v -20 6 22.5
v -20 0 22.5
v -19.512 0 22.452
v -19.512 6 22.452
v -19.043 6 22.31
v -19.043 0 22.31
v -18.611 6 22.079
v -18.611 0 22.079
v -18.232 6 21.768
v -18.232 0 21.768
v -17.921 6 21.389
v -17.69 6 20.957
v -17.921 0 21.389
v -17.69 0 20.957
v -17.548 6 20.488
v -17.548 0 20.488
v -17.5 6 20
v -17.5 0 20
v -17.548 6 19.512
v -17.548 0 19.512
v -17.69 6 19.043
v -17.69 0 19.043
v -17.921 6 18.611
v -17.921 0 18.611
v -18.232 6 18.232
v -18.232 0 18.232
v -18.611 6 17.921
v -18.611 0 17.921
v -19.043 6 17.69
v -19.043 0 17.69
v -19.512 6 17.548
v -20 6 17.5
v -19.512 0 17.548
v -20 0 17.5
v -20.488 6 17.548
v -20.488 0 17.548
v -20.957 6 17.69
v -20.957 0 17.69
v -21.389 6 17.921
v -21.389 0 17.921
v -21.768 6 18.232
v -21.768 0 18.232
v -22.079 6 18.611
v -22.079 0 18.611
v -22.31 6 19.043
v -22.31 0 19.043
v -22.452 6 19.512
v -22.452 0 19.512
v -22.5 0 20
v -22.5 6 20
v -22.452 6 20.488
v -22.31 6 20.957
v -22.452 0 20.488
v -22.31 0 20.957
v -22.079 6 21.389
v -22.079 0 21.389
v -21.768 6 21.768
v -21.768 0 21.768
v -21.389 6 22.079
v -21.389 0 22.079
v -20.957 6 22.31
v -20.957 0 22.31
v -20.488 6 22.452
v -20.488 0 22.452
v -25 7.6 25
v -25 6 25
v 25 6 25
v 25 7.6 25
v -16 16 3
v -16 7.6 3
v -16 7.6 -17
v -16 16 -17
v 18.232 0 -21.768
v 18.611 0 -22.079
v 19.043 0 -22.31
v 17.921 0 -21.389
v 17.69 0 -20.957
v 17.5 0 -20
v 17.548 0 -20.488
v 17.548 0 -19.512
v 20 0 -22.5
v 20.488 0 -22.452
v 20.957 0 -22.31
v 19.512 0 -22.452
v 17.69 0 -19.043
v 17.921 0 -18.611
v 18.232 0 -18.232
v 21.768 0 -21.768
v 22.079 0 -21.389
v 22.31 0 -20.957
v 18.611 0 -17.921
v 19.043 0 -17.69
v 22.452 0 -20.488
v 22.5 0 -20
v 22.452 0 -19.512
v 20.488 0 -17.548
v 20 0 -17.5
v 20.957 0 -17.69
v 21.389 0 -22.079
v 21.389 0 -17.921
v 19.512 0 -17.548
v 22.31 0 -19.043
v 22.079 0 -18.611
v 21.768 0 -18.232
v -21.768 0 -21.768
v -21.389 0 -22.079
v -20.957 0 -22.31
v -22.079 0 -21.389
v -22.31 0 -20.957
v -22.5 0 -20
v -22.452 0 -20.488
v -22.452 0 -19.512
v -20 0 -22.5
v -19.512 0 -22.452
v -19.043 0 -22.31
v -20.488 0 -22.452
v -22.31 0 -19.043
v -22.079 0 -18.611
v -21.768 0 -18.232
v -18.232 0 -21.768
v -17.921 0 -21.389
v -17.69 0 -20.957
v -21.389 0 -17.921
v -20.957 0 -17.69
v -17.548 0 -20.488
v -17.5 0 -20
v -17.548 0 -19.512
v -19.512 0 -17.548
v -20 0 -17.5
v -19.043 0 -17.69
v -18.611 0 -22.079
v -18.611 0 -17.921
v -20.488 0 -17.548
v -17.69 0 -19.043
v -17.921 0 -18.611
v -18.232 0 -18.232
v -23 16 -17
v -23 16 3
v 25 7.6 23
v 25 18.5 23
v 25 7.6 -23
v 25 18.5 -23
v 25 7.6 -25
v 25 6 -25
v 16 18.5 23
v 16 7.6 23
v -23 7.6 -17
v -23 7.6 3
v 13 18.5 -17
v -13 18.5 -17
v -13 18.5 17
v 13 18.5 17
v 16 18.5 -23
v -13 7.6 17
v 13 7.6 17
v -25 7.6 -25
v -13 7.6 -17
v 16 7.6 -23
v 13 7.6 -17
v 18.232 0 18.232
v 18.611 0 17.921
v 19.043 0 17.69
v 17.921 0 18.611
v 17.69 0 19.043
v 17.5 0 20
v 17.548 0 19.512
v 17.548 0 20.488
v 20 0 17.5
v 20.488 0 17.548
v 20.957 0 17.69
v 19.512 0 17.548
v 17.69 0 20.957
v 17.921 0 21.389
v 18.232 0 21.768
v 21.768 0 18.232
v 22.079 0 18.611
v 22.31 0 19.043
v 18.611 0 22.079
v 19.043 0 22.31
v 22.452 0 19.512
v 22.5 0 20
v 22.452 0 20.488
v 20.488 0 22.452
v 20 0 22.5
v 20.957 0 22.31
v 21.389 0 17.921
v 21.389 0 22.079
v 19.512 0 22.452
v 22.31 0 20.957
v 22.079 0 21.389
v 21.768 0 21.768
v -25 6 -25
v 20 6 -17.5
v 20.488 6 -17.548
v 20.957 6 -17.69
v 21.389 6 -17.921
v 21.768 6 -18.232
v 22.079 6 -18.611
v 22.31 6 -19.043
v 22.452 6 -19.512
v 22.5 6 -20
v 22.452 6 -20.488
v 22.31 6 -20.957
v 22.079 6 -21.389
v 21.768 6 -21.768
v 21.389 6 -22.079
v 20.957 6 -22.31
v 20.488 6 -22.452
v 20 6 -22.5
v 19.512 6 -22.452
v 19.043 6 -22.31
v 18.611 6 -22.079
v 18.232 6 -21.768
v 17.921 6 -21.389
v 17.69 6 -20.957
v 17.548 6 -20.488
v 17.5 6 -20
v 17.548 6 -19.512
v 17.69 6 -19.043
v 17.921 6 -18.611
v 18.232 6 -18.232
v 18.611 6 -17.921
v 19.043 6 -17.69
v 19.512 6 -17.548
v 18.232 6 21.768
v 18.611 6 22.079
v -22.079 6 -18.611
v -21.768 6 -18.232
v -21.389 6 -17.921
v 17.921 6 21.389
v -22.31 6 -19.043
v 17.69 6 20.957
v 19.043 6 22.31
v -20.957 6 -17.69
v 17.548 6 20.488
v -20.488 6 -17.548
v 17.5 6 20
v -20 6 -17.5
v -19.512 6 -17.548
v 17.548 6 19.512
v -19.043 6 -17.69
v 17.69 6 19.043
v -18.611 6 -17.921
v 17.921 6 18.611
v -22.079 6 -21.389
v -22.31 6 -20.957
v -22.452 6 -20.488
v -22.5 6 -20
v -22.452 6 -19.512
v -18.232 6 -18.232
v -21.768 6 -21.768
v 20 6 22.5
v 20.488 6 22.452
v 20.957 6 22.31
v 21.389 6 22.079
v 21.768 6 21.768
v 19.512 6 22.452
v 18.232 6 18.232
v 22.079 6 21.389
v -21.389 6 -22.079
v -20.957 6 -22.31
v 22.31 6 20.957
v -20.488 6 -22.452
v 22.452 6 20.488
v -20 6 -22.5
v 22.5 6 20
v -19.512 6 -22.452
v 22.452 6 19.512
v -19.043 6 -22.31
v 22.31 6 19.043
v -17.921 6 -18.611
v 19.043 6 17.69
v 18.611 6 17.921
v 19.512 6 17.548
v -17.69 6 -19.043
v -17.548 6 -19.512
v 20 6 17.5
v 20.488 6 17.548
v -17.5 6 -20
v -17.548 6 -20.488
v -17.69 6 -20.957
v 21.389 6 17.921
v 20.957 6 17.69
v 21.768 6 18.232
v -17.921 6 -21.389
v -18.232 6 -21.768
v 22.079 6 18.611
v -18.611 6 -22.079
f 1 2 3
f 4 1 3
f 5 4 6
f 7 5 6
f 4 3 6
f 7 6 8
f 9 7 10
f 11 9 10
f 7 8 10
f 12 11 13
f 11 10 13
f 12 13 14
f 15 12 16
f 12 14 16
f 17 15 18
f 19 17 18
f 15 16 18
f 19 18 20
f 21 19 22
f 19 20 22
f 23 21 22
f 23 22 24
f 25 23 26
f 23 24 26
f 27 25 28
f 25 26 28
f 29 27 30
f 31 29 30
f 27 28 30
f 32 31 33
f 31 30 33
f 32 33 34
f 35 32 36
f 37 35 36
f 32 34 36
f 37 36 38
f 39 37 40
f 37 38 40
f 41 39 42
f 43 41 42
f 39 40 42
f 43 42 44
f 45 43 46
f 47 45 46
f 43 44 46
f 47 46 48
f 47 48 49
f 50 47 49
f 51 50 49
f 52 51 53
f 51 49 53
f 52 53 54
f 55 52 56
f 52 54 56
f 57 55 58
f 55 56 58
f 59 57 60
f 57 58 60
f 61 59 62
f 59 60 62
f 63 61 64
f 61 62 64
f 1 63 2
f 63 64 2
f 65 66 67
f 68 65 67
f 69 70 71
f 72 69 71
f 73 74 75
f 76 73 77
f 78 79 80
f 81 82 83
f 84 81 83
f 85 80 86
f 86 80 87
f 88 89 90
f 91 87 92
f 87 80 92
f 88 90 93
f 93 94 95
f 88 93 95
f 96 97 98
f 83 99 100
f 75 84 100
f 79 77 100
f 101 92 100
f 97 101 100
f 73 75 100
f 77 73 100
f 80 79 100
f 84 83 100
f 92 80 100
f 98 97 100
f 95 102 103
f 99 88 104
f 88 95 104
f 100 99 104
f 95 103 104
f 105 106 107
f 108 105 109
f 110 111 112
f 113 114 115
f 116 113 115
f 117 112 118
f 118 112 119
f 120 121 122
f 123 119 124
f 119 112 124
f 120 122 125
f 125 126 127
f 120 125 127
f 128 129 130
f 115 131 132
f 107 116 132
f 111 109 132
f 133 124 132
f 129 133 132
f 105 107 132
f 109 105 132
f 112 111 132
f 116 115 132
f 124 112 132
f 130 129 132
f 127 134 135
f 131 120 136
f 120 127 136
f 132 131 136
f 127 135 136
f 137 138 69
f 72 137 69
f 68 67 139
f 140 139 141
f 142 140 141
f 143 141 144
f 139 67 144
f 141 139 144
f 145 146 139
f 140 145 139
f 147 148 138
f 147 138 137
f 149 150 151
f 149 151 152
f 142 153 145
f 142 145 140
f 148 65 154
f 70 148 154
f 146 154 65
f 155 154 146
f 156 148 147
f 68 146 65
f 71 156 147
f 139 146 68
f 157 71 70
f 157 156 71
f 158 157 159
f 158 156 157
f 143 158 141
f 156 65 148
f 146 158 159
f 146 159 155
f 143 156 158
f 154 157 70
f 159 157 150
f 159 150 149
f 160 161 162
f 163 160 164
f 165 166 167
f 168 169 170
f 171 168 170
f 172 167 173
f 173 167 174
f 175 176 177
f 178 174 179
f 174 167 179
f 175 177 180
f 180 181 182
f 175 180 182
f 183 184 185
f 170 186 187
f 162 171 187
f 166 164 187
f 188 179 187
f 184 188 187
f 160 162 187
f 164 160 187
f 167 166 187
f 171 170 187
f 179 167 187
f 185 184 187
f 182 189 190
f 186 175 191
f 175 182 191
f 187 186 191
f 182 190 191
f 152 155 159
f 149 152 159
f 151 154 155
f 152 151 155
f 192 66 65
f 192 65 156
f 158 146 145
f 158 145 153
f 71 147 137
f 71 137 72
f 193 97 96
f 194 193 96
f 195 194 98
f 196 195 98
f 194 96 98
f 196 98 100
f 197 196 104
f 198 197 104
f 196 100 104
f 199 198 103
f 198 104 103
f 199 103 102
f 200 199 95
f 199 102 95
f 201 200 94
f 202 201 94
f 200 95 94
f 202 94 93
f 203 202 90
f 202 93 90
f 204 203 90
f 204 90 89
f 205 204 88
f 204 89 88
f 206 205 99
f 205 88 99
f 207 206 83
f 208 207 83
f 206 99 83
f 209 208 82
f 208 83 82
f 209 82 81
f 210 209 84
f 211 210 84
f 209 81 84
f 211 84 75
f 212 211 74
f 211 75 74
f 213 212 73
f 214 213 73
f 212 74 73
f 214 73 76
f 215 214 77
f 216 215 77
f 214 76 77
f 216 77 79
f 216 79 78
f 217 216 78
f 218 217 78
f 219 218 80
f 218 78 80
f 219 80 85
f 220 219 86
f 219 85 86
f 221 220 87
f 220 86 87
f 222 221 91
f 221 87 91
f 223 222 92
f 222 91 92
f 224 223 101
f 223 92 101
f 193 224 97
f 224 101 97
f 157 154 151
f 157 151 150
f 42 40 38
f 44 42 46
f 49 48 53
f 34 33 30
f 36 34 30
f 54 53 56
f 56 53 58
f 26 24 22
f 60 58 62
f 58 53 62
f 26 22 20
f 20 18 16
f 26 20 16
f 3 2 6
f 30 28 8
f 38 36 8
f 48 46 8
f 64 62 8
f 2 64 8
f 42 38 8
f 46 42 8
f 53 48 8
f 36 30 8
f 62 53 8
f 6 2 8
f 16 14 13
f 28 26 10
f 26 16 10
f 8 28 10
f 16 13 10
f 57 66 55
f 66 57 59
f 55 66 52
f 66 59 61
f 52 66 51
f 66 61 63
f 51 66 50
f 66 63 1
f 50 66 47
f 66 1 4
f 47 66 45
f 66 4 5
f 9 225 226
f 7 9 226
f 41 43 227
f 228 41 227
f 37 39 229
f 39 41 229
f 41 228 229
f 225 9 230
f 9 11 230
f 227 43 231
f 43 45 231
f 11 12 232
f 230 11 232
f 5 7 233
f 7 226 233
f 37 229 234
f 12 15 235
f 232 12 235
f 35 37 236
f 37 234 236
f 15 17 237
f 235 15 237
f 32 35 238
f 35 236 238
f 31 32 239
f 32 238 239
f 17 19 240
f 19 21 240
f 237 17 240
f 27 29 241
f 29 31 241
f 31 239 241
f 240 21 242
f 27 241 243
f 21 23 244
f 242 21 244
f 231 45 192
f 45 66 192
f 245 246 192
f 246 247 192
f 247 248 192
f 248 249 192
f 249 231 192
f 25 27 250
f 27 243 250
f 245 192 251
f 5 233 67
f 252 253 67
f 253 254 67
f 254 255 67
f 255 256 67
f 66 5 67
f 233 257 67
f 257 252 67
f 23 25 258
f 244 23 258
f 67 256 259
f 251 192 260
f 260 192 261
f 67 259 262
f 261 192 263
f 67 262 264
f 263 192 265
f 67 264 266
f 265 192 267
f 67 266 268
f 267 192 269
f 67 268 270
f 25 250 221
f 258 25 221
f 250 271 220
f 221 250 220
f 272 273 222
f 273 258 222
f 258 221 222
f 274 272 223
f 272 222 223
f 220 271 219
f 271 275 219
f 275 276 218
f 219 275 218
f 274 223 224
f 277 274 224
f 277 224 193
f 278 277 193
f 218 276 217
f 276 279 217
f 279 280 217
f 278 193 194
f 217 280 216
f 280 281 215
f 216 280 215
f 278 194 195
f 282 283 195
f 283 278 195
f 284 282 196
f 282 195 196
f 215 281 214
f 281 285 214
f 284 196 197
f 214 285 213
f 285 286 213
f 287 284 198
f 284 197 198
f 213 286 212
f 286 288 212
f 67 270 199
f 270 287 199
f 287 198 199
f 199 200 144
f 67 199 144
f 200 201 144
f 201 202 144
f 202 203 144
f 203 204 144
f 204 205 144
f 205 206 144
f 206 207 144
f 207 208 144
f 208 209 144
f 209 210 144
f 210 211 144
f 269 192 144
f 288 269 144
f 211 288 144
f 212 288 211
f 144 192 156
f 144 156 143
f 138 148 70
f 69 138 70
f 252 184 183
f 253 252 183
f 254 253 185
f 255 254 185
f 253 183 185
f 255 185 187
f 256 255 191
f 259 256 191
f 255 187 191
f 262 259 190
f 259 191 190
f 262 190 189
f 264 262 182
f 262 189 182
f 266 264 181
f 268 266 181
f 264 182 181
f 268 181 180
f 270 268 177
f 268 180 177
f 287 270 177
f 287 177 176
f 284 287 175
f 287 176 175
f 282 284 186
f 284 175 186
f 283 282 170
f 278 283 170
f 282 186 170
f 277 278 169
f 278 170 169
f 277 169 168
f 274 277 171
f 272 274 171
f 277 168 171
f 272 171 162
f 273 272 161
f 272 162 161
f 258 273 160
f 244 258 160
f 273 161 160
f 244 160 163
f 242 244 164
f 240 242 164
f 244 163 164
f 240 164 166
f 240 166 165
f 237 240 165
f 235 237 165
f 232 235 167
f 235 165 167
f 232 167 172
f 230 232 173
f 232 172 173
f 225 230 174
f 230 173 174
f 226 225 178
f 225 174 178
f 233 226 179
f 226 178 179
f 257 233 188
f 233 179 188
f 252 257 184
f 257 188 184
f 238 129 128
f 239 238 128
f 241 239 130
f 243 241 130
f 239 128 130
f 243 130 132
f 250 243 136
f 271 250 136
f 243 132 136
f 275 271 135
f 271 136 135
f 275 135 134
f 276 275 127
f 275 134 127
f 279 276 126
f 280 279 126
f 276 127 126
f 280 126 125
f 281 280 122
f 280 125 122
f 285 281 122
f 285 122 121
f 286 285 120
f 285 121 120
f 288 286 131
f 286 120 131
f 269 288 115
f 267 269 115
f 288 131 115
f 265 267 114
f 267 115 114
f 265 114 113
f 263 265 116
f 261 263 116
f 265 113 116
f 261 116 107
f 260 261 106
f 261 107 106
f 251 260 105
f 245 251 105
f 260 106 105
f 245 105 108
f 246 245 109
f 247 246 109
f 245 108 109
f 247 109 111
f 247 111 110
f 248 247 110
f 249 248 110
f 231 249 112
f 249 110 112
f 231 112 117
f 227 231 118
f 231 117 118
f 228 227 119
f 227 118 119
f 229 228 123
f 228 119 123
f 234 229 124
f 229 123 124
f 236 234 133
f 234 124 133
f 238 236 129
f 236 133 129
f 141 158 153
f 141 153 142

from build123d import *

# Parameters (mm, degrees)
SK_P01_STANDOFF_R                  = 2.5
P01_STANDOFF_DEPTH                 = 6
SK_P02_STANDOFF_R                  = 2.5
P02_STANDOFF_DEPTH                 = 6
SK_P03_STANDOFF_R                  = 2.5
P03_STANDOFF_DEPTH                 = 6
SK_P04_STANDOFF_R                  = 2.5
P04_STANDOFF_DEPTH                 = 6
P05_DFR0601BOARD50X50_START        = 6
SK_P05_DFR0601BOARD50X50_W         = 50
SK_P05_DFR0601BOARD50X50_H         = 50
P05_DFR0601BOARD50X50_DEPTH        = 1.6
P06_MOSFETSANDHEATSINK_START       = 7.6
SK_P06_MOSFETSANDHEATSINK_W        = 26
SK_P06_MOSFETSANDHEATSINK_H        = 34
P06_MOSFETSANDHEATSINK_DEPTH       = 10.9
P07_POWERANDMOTORTERMINALSWI_START = 7.6
SK_P07_POWERANDMOTORTERMINALSWI_W  = 9
SK_P07_POWERANDMOTORTERMINALSWI_H  = 46
P07_POWERANDMOTORTERMINALSWI_DEPTH = 10.9
P08_CONTROLHEADER_START            = 7.6
SK_P08_CONTROLHEADER_W             = 7
SK_P08_CONTROLHEADER_H             = 20
P08_CONTROLHEADER_DEPTH            = 8.4


with BuildPart() as part:
    # SK_P01_Standoff → P01_Standoff (new body)
    with BuildSketch(Plane(origin=(0, 0, 0), x_dir=(1, 0, 0), z_dir=(0, 1, 0))):
        with Locations(Location((-20, 20, 0), (0, 0, 270))):
            Circle(SK_P01_STANDOFF_R)
    extrude(amount=P01_STANDOFF_DEPTH)



with BuildPart() as body_2:
    # SK_P02_Standoff → P02_Standoff (new body)
    with BuildSketch(Plane(origin=(0, 0, 0), x_dir=(1, 0, 0), z_dir=(0, 1, 0))):
        with Locations(Location((20, 20, 0), (0, 0, 270))):
            Circle(SK_P02_STANDOFF_R)
    extrude(amount=P02_STANDOFF_DEPTH)


with BuildPart() as body_3:
    # SK_P03_Standoff → P03_Standoff (new body)
    with BuildSketch(Plane(origin=(0, 0, 0), x_dir=(1, 0, 0), z_dir=(0, 1, 0))):
        with Locations(Location((-20, -20, 0), (0, 0, 270))):
            Circle(SK_P03_STANDOFF_R)
    extrude(amount=P03_STANDOFF_DEPTH)


with BuildPart() as body_4:
    # SK_P04_Standoff → P04_Standoff (new body)
    with BuildSketch(Plane(origin=(0, 0, 0), x_dir=(1, 0, 0), z_dir=(0, 1, 0))):
        with Locations(Location((20, -20, 0), (0, 0, 270))):
            Circle(SK_P04_STANDOFF_R)
    extrude(amount=P04_STANDOFF_DEPTH)


with BuildPart() as part_1:
    add(part.part)

    add(body_2.part)  # P05_DFR0601board50x50 merges body 2

    add(body_3.part)  # P05_DFR0601board50x50 merges body 3

    add(body_4.part)  # P05_DFR0601board50x50 merges body 4
    # SK_P05_DFR0601board50x50 → P05_DFR0601board50x50 (add)
    with BuildSketch(Plane(origin=(0, 0, 0), x_dir=(1, 0, 0), z_dir=(0, 1, 0)).offset(P05_DFR0601BOARD50X50_START)):
        Rectangle(SK_P05_DFR0601BOARD50X50_W, SK_P05_DFR0601BOARD50X50_H)
    extrude(amount=P05_DFR0601BOARD50X50_DEPTH)

    # SK_P06_MOSFETsandheatsink → P06_MOSFETsandheatsink (add)
    with BuildSketch(Plane(origin=(0, 0, 0), x_dir=(1, 0, 0), z_dir=(0, 1, 0)).offset(P06_MOSFETSANDHEATSINK_START)):
        Rectangle(SK_P06_MOSFETSANDHEATSINK_W, SK_P06_MOSFETSANDHEATSINK_H)
    extrude(amount=P06_MOSFETSANDHEATSINK_DEPTH)

    # SK_P07_Powerandmotorterminalswi → P07_Powerandmotorterminalswi (add)
    with BuildSketch(Plane(origin=(0, 0, 0), x_dir=(1, 0, 0), z_dir=(0, 1, 0)).offset(P07_POWERANDMOTORTERMINALSWI_START)):
        with Locations((20.5, 0)):
            Rectangle(SK_P07_POWERANDMOTORTERMINALSWI_W, SK_P07_POWERANDMOTORTERMINALSWI_H)
    extrude(amount=P07_POWERANDMOTORTERMINALSWI_DEPTH)

    # SK_P08_Controlheader → P08_Controlheader (add)
    with BuildSketch(Plane(origin=(0, 0, 0), x_dir=(1, 0, 0), z_dir=(0, 1, 0)).offset(P08_CONTROLHEADER_START)):
        with Locations((-19.5, 7)):
            Rectangle(SK_P08_CONTROLHEADER_W, SK_P08_CONTROLHEADER_H)
    extrude(amount=P08_CONTROLHEADER_DEPTH)


solid = part_1.part
